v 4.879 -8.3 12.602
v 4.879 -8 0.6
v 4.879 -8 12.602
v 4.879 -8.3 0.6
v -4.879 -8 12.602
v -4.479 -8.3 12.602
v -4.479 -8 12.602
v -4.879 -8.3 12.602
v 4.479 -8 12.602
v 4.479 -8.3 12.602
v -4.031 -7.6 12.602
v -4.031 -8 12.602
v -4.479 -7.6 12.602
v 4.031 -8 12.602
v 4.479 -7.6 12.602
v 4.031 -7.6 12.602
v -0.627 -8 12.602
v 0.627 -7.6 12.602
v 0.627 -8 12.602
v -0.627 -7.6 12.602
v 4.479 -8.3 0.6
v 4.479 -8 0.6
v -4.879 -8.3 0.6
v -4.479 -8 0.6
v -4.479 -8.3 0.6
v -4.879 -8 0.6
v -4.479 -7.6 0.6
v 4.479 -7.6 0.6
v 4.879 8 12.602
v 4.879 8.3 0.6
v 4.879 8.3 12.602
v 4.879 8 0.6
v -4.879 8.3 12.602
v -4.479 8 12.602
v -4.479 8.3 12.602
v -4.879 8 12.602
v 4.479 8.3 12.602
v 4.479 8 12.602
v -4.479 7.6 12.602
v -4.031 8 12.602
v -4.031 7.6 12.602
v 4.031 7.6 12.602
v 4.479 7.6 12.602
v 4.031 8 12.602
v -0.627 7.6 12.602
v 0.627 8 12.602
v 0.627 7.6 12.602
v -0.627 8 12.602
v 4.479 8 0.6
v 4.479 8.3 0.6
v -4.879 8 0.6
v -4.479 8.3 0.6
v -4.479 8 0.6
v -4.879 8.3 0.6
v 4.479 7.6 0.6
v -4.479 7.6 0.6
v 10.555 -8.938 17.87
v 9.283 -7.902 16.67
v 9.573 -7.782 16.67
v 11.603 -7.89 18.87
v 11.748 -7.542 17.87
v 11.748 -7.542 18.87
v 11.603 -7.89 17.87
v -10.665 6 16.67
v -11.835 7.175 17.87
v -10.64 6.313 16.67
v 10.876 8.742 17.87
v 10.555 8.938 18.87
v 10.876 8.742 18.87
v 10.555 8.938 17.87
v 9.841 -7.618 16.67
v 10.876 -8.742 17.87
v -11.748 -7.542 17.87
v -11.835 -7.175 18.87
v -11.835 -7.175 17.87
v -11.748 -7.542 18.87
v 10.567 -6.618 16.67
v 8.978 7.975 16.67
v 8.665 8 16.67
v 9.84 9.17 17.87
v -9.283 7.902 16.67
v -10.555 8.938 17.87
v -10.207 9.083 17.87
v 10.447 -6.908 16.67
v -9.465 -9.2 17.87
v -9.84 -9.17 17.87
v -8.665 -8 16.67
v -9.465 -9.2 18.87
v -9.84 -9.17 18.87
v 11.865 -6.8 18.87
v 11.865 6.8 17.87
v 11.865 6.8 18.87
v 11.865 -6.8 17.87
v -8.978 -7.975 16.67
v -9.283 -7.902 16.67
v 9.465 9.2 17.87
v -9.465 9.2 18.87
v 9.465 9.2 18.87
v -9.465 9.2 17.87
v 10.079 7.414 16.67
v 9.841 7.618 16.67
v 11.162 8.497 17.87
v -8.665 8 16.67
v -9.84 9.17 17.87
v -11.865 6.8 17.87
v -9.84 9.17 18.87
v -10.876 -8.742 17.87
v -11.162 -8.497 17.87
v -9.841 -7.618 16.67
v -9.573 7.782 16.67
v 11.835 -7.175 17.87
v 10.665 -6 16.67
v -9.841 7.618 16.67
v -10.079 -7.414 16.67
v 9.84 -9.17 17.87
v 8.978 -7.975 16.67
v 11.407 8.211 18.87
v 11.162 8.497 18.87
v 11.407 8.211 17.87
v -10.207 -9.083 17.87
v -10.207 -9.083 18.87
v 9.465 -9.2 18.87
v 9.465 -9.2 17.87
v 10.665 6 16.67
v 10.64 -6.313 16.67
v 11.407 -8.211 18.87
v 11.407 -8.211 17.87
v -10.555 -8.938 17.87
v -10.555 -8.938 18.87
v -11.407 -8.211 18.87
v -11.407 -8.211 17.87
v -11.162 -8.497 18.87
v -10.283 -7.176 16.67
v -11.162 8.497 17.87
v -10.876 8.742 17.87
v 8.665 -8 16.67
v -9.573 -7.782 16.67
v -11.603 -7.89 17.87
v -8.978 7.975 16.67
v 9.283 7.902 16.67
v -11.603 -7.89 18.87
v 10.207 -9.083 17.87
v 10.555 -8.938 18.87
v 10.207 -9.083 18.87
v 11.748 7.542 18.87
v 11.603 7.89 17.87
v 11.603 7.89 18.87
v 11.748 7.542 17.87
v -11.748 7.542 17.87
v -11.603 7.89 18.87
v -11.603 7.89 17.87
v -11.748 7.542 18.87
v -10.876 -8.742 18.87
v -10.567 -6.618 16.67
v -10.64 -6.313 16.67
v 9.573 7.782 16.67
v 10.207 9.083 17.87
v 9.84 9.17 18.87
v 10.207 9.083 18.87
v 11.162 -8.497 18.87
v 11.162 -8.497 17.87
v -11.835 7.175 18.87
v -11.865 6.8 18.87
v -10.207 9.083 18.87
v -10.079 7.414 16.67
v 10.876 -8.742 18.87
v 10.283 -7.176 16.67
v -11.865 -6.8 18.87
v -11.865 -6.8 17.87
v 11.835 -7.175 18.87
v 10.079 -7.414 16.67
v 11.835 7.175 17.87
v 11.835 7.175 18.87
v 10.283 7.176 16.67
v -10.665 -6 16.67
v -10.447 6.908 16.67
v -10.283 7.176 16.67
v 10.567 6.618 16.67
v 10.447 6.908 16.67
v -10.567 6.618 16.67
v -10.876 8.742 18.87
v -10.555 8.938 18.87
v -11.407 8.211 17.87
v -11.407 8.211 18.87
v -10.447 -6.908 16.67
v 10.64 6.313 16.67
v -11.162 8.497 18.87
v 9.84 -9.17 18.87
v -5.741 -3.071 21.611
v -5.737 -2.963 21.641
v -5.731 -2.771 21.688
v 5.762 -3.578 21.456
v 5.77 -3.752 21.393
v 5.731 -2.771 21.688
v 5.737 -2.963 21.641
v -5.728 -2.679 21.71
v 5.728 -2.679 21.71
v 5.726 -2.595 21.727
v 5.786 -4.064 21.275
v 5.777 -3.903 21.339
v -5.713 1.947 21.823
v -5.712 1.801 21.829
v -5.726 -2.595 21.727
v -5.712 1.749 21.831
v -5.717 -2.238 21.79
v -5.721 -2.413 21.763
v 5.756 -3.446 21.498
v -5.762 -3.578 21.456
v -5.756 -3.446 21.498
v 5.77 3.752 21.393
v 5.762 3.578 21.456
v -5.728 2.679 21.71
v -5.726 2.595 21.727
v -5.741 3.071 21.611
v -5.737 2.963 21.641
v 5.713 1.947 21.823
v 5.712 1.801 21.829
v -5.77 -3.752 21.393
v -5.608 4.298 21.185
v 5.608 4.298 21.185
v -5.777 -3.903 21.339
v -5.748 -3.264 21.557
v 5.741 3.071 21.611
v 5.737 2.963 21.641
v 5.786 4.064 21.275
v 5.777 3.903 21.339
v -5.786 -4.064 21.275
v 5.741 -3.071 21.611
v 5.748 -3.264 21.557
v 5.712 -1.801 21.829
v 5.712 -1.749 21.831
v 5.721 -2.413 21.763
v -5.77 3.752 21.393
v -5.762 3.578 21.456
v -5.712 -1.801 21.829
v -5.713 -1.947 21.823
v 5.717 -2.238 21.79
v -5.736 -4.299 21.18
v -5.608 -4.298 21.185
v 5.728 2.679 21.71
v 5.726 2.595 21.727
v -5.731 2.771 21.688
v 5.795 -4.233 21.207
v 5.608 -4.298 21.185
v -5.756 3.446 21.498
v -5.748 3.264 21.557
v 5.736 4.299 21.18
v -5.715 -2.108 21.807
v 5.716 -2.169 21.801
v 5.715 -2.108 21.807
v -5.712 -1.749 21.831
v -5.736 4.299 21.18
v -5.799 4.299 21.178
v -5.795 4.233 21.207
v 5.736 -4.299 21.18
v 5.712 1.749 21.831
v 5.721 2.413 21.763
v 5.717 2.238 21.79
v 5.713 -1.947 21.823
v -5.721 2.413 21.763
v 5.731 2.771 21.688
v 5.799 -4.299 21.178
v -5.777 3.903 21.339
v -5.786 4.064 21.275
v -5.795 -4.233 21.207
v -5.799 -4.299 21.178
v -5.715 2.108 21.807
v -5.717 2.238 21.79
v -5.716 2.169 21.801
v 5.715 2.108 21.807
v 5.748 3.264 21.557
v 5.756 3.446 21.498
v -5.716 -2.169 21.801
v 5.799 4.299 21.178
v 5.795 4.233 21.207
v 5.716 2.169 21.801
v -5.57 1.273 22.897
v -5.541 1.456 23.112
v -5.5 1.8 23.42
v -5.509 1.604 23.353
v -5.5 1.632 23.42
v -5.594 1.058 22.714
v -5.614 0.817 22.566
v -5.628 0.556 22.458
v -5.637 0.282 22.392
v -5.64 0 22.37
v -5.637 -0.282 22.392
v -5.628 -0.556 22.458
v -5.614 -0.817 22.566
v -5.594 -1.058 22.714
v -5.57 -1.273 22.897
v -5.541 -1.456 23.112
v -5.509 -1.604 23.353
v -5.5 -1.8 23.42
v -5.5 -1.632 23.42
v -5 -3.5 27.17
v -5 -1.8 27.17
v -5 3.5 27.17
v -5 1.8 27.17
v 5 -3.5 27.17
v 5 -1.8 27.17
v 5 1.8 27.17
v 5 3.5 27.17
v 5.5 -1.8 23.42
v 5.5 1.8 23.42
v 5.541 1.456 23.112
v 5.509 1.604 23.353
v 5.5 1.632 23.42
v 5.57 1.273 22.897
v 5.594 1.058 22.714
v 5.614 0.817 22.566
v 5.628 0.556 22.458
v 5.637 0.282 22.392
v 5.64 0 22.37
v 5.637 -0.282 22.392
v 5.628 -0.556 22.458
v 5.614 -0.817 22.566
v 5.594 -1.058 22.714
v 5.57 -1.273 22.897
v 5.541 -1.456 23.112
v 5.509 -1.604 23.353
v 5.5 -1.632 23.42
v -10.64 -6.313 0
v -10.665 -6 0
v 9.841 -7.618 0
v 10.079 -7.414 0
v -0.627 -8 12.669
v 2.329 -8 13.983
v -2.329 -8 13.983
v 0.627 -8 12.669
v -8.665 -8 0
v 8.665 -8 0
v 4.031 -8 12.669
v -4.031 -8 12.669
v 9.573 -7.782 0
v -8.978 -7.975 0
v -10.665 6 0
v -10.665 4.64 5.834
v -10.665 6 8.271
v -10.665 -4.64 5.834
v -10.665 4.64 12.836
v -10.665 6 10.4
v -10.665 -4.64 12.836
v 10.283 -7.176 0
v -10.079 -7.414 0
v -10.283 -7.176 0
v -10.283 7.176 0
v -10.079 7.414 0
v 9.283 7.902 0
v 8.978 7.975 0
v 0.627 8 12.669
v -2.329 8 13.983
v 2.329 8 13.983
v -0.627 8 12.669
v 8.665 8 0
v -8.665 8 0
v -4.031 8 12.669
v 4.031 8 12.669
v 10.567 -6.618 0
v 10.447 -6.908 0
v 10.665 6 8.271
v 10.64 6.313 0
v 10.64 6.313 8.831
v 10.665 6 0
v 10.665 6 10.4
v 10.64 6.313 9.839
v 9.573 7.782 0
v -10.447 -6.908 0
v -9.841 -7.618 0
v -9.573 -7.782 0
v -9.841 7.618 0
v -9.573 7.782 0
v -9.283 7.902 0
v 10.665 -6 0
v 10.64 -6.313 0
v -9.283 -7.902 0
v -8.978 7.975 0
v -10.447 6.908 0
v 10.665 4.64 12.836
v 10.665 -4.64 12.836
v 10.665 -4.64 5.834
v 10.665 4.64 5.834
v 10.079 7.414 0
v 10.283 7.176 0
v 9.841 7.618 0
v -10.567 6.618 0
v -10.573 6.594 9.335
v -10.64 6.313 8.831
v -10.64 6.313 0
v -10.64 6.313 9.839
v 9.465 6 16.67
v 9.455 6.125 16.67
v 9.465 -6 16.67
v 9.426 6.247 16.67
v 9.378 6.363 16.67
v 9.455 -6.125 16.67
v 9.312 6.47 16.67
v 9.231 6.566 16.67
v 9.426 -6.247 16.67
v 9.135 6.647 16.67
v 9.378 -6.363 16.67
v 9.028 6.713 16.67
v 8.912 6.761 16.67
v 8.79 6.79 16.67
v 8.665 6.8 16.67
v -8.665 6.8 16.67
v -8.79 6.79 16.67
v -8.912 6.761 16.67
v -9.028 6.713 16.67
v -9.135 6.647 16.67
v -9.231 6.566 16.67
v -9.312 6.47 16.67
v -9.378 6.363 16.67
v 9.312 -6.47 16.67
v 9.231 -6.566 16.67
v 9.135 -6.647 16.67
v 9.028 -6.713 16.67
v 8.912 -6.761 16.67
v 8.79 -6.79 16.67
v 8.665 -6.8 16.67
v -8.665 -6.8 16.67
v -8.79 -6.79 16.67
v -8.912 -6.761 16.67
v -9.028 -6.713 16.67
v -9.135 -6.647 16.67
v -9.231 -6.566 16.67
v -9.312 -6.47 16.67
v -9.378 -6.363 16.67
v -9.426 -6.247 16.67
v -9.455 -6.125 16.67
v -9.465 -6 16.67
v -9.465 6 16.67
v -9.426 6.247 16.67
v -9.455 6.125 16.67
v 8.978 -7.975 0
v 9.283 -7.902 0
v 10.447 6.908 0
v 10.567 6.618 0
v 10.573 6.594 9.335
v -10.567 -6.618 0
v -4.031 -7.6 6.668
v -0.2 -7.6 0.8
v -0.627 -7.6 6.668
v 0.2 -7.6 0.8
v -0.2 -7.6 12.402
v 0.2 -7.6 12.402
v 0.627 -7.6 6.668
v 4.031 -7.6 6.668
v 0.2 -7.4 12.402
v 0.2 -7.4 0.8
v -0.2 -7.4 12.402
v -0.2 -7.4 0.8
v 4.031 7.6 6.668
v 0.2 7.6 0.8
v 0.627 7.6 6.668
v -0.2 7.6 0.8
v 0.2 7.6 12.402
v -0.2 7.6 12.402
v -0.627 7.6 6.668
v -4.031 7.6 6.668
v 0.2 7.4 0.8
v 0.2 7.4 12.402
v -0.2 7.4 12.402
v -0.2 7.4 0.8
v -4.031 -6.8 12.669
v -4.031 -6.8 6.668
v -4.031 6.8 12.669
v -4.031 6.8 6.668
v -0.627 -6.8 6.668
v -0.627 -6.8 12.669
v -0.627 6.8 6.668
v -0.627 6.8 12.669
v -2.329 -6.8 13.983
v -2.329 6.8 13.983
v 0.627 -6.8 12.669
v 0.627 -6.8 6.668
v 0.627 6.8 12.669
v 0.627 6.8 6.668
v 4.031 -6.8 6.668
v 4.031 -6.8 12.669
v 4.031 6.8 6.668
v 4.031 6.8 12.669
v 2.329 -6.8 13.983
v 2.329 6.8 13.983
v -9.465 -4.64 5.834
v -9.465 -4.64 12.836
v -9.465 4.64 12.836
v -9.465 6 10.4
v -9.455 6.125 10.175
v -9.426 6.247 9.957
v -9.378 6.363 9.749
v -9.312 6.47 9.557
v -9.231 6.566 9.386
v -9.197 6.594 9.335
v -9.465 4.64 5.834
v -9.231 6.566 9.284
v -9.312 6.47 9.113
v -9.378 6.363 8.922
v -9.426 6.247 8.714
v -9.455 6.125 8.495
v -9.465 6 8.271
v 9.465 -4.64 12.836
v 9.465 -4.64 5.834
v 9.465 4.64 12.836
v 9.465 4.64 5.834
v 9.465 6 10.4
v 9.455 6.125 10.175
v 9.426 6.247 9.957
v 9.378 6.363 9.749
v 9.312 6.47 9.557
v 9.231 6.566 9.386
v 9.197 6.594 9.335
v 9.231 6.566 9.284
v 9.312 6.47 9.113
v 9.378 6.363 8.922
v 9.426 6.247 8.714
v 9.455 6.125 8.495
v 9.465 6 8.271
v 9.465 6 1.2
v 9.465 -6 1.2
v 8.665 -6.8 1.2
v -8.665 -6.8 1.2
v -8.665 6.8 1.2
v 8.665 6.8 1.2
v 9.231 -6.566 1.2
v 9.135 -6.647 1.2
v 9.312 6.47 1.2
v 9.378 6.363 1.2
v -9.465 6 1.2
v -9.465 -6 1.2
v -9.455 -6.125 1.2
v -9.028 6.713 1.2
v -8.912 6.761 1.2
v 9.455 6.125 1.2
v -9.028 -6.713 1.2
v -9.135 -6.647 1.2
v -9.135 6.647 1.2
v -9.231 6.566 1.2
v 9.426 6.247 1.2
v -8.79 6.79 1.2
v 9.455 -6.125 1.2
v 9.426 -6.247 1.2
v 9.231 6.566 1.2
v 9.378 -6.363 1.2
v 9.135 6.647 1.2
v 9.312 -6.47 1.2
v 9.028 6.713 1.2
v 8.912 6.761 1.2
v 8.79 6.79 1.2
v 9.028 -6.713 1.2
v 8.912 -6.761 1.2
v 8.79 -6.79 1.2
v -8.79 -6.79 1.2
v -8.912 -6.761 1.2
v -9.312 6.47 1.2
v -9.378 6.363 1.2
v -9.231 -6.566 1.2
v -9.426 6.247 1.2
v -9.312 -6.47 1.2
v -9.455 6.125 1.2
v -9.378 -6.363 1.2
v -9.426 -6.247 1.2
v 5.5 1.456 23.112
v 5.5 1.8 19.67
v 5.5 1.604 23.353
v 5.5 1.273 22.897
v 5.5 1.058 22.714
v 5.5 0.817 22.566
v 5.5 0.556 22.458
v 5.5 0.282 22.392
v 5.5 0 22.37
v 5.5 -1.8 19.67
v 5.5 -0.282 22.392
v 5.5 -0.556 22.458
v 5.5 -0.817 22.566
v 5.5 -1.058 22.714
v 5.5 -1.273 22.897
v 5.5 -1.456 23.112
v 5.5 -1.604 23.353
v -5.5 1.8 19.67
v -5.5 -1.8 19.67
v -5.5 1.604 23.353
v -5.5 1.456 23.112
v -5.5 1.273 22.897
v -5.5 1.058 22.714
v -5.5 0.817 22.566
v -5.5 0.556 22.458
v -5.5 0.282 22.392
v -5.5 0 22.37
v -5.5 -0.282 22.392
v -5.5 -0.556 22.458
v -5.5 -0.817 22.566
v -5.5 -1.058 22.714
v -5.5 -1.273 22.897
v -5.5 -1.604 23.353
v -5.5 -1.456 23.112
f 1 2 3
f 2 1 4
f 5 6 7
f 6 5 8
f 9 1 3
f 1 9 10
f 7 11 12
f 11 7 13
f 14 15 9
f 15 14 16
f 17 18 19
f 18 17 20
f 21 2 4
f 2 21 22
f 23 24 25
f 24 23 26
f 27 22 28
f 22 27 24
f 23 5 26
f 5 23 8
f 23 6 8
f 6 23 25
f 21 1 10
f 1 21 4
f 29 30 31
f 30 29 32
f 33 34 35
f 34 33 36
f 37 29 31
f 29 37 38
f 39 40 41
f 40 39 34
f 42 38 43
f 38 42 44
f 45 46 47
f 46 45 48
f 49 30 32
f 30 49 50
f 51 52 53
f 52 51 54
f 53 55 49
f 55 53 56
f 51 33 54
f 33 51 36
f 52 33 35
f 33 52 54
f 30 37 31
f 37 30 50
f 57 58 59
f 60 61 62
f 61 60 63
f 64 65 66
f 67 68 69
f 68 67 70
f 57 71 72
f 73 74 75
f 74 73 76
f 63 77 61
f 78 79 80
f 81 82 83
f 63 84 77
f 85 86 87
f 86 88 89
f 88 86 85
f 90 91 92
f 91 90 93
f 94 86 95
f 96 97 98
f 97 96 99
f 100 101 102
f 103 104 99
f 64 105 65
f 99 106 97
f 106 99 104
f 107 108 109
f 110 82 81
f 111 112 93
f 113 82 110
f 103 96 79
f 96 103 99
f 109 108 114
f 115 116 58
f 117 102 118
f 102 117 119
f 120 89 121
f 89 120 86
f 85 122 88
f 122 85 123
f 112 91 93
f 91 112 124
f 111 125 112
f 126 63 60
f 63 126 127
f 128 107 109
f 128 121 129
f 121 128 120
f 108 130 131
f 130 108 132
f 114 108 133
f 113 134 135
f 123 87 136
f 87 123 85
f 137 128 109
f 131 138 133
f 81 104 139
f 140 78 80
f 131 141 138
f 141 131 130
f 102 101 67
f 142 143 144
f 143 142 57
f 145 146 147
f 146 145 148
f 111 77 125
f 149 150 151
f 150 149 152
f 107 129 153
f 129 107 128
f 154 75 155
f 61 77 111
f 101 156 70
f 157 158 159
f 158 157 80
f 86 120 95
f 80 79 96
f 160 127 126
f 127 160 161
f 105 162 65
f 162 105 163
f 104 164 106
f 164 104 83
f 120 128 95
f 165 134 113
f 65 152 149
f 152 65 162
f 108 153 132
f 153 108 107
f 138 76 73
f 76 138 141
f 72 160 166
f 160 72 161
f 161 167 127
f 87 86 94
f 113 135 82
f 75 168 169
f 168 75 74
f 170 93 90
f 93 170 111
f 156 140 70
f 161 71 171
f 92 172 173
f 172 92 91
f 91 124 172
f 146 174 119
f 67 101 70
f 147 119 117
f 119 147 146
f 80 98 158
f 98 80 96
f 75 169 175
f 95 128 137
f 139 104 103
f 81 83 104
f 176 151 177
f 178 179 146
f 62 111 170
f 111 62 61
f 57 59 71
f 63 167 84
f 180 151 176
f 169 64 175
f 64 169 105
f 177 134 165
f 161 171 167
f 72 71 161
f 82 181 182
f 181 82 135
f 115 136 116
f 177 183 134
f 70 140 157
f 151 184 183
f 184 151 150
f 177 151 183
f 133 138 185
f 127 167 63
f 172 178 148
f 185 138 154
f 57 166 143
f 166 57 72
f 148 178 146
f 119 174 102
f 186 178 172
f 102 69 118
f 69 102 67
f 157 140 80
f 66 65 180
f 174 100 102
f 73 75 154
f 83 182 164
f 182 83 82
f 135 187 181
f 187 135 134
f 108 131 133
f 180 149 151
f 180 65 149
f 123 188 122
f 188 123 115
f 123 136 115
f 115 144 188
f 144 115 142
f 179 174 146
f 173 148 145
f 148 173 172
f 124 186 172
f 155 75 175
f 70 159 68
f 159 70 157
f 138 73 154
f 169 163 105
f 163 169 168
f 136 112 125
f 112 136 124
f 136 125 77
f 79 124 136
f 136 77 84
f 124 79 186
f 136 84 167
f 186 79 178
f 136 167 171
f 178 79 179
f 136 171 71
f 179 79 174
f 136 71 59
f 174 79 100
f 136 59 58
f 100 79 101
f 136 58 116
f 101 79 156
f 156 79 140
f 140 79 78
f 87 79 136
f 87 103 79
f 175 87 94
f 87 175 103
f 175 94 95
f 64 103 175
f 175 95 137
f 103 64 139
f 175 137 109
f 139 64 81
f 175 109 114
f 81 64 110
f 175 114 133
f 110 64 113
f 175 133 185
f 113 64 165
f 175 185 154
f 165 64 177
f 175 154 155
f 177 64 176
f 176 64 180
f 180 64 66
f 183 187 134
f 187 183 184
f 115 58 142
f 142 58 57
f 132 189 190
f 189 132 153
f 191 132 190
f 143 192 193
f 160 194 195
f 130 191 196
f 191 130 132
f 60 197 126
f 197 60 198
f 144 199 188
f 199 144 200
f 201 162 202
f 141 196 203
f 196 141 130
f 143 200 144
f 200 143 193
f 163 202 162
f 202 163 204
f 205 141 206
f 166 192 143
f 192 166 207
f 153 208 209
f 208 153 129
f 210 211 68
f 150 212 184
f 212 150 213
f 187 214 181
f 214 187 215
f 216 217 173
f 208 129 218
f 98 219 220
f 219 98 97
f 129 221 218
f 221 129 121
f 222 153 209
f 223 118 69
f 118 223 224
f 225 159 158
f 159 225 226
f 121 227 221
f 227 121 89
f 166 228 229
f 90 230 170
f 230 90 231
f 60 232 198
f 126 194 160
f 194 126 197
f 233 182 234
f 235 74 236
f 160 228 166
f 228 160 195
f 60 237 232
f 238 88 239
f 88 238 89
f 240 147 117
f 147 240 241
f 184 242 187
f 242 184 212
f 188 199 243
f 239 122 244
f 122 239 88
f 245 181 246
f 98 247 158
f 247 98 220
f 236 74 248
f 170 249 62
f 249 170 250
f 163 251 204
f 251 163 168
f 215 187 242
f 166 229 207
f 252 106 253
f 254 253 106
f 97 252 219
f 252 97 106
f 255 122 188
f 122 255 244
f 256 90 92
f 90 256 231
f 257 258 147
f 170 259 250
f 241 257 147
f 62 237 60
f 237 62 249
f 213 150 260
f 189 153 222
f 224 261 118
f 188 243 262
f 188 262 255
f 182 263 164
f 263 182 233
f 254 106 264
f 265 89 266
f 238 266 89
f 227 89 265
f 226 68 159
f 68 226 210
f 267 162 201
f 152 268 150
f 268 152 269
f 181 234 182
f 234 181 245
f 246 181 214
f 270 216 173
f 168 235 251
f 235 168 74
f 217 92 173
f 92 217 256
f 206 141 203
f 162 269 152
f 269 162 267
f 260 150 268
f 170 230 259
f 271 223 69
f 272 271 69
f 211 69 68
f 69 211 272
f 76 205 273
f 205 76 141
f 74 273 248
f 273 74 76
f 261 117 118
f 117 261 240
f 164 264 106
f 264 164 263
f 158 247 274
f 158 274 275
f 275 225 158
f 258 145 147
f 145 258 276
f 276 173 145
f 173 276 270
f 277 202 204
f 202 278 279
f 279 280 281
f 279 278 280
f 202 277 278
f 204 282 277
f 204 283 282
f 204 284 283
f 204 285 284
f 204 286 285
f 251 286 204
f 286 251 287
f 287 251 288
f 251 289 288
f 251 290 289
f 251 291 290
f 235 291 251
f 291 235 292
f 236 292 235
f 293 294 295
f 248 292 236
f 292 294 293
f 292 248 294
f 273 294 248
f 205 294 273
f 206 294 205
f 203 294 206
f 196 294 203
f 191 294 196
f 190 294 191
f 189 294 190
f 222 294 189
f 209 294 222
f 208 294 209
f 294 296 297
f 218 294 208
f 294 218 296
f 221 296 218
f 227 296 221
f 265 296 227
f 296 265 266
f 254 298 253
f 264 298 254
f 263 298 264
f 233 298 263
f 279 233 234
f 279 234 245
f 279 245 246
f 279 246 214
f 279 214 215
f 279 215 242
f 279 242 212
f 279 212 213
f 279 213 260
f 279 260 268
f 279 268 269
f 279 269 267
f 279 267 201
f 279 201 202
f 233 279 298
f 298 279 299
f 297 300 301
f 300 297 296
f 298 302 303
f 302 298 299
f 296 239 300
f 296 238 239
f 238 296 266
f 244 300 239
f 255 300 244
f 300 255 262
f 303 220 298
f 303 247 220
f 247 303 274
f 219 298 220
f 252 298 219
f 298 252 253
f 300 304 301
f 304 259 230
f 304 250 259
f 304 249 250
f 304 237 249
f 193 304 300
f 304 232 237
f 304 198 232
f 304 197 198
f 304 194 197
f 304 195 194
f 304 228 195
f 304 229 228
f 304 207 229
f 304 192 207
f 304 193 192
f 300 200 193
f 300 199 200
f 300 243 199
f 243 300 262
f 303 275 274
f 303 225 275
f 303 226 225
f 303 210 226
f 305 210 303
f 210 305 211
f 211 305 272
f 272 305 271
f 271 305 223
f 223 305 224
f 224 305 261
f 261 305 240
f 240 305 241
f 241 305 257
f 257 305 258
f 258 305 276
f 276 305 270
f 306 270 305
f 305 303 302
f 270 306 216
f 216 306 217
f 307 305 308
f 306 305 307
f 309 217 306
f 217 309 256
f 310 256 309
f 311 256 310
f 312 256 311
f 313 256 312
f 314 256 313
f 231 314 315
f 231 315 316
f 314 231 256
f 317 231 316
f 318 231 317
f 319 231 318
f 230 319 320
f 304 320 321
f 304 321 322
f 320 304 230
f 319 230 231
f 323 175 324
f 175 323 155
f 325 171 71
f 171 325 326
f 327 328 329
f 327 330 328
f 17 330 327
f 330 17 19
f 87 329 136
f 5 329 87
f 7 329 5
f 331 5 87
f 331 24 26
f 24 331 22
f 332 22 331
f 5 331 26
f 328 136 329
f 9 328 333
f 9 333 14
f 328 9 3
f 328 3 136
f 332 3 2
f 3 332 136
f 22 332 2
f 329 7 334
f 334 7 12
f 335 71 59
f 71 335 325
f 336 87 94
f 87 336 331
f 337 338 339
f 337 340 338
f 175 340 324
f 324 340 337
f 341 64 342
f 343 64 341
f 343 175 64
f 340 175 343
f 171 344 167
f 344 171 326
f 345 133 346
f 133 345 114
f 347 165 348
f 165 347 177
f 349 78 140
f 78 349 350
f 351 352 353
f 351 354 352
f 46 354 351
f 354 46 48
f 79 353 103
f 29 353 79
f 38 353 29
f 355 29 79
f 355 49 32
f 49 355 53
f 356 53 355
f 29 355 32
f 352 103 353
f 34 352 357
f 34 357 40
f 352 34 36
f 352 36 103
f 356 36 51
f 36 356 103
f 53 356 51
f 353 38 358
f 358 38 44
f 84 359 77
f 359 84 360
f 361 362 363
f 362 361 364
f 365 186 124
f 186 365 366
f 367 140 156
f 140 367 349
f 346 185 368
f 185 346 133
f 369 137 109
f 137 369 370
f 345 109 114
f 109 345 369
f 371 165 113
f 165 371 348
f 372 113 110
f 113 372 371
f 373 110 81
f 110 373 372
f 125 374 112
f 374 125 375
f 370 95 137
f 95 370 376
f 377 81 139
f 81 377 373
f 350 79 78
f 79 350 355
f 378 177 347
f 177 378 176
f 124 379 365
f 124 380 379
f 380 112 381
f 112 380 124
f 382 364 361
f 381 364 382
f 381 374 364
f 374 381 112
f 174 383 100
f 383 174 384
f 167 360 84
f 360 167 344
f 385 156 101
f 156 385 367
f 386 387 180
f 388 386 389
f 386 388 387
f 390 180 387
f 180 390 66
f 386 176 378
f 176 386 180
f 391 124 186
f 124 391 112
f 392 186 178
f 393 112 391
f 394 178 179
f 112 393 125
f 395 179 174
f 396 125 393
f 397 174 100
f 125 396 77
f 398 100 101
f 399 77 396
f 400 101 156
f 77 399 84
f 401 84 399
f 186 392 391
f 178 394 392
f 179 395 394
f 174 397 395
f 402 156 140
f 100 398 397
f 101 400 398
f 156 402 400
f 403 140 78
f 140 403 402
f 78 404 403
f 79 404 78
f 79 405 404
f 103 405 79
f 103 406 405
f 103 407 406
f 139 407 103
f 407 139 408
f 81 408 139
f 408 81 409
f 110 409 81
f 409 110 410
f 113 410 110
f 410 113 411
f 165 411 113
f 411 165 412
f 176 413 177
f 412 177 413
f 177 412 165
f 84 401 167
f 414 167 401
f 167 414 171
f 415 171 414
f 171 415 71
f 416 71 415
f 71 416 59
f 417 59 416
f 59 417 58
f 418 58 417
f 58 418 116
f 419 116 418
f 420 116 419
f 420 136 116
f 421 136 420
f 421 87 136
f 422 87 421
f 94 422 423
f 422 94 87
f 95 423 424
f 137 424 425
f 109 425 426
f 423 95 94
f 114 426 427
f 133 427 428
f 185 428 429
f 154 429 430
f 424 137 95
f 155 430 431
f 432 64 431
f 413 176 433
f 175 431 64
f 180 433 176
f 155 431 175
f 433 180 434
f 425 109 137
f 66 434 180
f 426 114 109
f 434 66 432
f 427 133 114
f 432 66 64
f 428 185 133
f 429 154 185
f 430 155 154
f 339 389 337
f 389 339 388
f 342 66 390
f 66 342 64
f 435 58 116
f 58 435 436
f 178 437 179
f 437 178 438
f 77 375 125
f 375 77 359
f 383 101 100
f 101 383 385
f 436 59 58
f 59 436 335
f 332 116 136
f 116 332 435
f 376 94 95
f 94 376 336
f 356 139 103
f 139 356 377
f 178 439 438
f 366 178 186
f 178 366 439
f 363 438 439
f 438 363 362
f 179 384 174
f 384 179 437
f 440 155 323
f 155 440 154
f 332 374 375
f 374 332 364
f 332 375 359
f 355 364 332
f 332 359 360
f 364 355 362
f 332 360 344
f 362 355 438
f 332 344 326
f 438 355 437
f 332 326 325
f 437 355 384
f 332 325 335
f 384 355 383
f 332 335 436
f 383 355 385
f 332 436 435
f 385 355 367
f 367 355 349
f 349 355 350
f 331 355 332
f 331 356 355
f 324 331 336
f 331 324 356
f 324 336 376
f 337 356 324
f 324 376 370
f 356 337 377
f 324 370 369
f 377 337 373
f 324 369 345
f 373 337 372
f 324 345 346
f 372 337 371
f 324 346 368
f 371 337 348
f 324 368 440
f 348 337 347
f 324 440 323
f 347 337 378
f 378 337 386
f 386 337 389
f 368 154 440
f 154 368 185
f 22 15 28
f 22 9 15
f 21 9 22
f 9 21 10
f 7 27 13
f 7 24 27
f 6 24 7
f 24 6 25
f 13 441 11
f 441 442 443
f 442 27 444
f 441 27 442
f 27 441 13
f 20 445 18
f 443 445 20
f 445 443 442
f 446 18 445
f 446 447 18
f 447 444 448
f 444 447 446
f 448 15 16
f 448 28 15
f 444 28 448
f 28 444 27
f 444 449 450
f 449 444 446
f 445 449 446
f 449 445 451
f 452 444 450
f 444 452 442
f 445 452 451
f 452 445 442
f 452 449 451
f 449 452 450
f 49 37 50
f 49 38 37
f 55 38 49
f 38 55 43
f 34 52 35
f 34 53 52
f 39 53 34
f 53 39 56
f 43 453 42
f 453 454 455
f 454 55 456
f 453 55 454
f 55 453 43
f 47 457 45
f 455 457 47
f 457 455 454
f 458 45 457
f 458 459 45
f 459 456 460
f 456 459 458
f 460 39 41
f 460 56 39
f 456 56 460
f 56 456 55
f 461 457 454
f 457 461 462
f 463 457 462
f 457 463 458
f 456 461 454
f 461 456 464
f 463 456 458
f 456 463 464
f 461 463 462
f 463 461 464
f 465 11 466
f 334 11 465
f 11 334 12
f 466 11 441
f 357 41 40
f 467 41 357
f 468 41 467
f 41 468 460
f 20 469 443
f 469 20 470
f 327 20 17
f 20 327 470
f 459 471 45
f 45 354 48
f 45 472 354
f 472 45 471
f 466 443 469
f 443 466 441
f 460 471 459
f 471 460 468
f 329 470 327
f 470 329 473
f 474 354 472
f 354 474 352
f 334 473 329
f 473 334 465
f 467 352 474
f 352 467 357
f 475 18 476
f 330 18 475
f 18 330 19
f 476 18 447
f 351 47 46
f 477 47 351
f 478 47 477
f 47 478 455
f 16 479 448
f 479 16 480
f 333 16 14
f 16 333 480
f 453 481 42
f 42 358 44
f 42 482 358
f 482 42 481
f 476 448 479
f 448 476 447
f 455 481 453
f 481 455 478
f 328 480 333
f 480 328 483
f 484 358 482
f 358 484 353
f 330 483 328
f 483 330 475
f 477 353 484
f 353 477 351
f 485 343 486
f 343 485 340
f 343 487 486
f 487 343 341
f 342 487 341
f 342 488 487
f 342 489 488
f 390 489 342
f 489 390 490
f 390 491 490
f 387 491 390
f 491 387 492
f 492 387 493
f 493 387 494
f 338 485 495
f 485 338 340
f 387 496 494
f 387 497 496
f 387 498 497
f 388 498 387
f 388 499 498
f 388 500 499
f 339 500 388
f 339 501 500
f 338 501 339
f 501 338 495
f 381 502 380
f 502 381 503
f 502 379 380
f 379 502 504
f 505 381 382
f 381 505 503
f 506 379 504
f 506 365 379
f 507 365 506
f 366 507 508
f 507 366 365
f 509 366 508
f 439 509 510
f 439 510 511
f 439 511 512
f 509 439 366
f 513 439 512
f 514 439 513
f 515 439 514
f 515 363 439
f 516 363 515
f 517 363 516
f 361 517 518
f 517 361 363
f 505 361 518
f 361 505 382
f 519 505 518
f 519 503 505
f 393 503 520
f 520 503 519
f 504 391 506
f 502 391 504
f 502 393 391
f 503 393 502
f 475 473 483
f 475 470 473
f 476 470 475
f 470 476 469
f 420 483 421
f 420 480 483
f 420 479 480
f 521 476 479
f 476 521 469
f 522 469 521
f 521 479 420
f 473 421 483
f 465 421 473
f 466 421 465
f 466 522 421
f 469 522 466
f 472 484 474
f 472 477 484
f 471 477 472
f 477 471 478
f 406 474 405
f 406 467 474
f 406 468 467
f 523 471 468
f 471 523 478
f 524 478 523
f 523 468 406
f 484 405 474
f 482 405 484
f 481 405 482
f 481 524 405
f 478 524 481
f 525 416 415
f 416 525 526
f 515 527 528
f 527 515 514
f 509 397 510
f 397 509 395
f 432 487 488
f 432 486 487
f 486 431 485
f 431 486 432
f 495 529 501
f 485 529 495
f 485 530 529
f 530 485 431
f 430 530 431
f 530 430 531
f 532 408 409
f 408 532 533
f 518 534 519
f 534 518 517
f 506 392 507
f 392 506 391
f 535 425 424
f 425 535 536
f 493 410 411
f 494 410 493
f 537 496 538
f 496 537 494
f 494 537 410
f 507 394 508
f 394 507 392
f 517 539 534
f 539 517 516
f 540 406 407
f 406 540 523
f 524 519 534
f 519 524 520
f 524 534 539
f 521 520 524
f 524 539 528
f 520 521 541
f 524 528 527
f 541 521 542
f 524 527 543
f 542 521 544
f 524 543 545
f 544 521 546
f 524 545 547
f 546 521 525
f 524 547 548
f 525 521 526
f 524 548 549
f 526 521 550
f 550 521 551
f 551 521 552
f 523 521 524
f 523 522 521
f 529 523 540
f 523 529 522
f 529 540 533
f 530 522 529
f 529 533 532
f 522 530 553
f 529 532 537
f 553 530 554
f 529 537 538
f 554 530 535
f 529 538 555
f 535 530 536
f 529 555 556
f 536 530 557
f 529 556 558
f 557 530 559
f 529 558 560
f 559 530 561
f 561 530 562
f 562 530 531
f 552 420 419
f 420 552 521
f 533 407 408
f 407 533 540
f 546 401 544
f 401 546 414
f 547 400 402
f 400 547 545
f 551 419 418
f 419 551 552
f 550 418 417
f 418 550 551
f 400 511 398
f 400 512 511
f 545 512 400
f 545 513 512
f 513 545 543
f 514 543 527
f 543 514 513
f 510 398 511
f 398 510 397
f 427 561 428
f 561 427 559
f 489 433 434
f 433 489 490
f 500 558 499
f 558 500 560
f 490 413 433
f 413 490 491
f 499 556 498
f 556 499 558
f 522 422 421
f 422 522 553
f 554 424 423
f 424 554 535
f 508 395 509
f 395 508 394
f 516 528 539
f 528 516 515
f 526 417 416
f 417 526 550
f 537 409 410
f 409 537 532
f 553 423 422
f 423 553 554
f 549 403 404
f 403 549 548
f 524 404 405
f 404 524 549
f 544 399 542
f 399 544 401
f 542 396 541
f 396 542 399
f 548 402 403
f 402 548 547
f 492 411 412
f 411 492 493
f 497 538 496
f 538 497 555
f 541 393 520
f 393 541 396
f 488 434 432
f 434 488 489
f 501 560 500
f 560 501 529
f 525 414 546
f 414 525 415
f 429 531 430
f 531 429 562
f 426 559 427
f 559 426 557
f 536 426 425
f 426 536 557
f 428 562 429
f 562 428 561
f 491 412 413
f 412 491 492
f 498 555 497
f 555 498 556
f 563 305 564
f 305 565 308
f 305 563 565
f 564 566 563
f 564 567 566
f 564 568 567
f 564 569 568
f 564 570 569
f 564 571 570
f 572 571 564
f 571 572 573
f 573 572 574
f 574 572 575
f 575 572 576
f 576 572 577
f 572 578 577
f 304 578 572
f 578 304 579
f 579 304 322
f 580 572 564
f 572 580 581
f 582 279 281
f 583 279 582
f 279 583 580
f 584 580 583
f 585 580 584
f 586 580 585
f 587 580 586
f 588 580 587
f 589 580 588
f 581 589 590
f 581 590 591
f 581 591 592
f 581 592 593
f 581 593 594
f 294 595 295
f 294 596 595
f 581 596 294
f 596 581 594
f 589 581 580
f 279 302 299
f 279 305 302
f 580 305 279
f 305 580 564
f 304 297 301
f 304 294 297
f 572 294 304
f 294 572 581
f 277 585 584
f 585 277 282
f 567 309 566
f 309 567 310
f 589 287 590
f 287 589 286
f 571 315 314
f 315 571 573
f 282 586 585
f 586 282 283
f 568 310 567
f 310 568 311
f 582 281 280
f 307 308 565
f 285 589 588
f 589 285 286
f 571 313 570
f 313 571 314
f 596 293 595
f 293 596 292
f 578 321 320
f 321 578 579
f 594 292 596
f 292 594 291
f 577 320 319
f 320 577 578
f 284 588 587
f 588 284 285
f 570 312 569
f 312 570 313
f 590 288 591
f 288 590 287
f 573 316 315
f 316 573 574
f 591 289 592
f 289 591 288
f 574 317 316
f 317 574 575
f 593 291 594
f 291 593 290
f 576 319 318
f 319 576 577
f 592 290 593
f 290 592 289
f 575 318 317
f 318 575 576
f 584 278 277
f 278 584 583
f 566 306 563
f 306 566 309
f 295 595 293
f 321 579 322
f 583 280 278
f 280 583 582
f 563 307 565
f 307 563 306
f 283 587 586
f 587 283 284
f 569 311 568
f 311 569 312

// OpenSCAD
// ====================================================================
// 1-Piece Unified Gondola Cabin Body & Roof (100% Support-Free)
//
// Print Orientation:
// - Roof is fused directly onto the top of the cabin body as a single object.
// - Sits 100% flat on build plate at Z = 0 (cabin floor).
// - Roof overhang uses a 45-degree self-supporting chamfer profile = ZERO SUPPORTS NEEDED!
// - Keeps identical envelope, door, window, and hanger clevis dimensions.
// ====================================================================

$fn = 40;

// Dimensions (mm) - Scaled to 1/3 size
cabin_w       = 16.0;  // Width (across track)
cabin_l       = 21.33; // Length (along track)
cabin_h       = 16.67; // Body height
wall_th       = 1.2;   // Wall thickness
corner_r      = 2.0;   // Rounded corner radius

// Hanger Dimensions
hanger_height = 21.67;
hanger_offset = 8.67;
hanger_th     = 3.2;

module rounded_box(l, w, h, r) {
    hull() {
        for (x = [-l/2 + r, l/2 - r]) {
            for (y = [-w/2 + r, w/2 - r]) {
                translate([x, y, 0])
                    cylinder(r = r, h = h);
            }
        }
    }
}

module gondola_cabin_single_piece() {
    door_w = cabin_l * 0.42;
    door_h = cabin_h * 0.72;
    door_z = 0.6 + door_h / 2;
    
    roof_lip = 1.2;
    roof_h   = 5.0;
    clevis_slot_w = 3.6;
    clevis_h      = 5.0;

    difference() {
        union() {
            // Main Cabin Body
            rounded_box(cabin_l, cabin_w, cabin_h, corner_r);
            
            // Outer door frame molding / trim on sides (+Y and -Y)
            for (y_sign = [-1, 1]) {
                translate([0, y_sign * (cabin_w / 2 + 0.1), door_z])
                    cube([door_w + 0.8, 0.4, door_h], center = true);
            }
            
            // Integrated 1-Piece Roof (Fused seamlessly at cabin_h)
            translate([0, 0, cabin_h]) {
                // 45-degree self-supporting underside flare transition (ZERO overhang droop!)
                hull() {
                    translate([0, 0, 0])
                        rounded_box(cabin_l, cabin_w, 0.1, corner_r);
                    translate([0, 0, roof_lip])
                        rounded_box(cabin_l + roof_lip*2, cabin_w + roof_lip*2, 0.1, corner_r + 0.4);
                }
                
                // Hipped pitched roof cap
                hull() {
                    translate([0, 0, roof_lip])
                        rounded_box(cabin_l + roof_lip*2, cabin_w + roof_lip*2, 1.0, corner_r + 0.4);
                    translate([0, 0, roof_h])
                        rounded_box(cabin_l * 0.45, cabin_w * 0.25, 0.6, 1.0);
                }
                
                // Top Hanger Arm Mounting Clevis Bracket (45-degree chamfered base into roof peak)
                translate([0, 0, roof_h / 2])
                    hull() {
                        cube([12.0, 9.0, 1.0], center = true);
                        translate([0, 0, roof_h / 2 + clevis_h / 2])
                            cube([10.0, 7.0, clevis_h + 1], center = true);
                    }
            }
        }

        
        // Hollow interior cavity (stops at cabin ceiling to create a solid top roof!)
        translate([0, 0, wall_th])
            rounded_box(cabin_l - wall_th*2, cabin_w - wall_th*2, cabin_h - wall_th, max(0.8, corner_r - wall_th));

        
        // Door panel recessed outlines and seams on both sides (+Y and -Y)
        for (y_sign = [-1, 1]) {
            translate([0, y_sign * (cabin_w / 2), door_z])
                cube([door_w, 0.8, door_h], center = true);

            translate([0, y_sign * (cabin_w / 2), door_z])
                cube([0.4, 1.2, door_h - 0.4], center = true);
                
            translate([1.2, y_sign * (cabin_w / 2 + 0.15), door_z])
                rotate([90, 0, 0])
                    cylinder(d = 1.0, h = 1.0, center = true);
            translate([-1.2, y_sign * (cabin_w / 2 + 0.15), door_z])
                rotate([90, 0, 0])
                    cylinder(d = 1.0, h = 1.0, center = true);
        }

        // Side Door Window Cutouts (45-degree self-supporting arches)
        for (x = [-door_w * 0.26, door_w * 0.26]) {
            translate([x, 0, cabin_h * 0.58])
                rotate([90, 0, 0])
                    hull() {
                        cube([door_w * 0.38, cabin_h * 0.36, cabin_w + 10], center = true);
                        translate([0, cabin_h * 0.16, 0])
                            rotate([0, 0, 45])
                                cube([door_w * 0.26, door_w * 0.26, cabin_w + 10], center = true);
                    }
        }
        
        // Front & Rear Windows
        for (x = [-cabin_l/2 - 2, cabin_l/2 + 2]) {
            translate([x, 0, cabin_h * 0.56])
                rotate([0, 90, 0])
                    hull() {
                        cube([cabin_h * 0.42, cabin_w * 0.58, 20], center = true);
                        translate([0, cabin_w * 0.20, 0])
                            rotate([0, 0, 45])
                                cube([cabin_w * 0.3, cabin_w * 0.3, 20], center = true);
                    }
        }

        // Clevis slot for hanger arm tab (centered at Y = 0.0mm)
        translate([0, 0, cabin_h + roof_h + clevis_h / 2 + 0.5])
            cube([11.0, clevis_slot_w, clevis_h + 5], center = true);

        // Clevis M3 horizontal cross-pin hole (punches cleanly through both ears)
        translate([0, 0, cabin_h + roof_h + clevis_h * 0.5])
            rotate([0, 90, 0])
                cylinder(d = 3.6, h = 18.0, center = true);
    }
}



// Render flat on bed at Z = 0
gondola_cabin_single_piece();
